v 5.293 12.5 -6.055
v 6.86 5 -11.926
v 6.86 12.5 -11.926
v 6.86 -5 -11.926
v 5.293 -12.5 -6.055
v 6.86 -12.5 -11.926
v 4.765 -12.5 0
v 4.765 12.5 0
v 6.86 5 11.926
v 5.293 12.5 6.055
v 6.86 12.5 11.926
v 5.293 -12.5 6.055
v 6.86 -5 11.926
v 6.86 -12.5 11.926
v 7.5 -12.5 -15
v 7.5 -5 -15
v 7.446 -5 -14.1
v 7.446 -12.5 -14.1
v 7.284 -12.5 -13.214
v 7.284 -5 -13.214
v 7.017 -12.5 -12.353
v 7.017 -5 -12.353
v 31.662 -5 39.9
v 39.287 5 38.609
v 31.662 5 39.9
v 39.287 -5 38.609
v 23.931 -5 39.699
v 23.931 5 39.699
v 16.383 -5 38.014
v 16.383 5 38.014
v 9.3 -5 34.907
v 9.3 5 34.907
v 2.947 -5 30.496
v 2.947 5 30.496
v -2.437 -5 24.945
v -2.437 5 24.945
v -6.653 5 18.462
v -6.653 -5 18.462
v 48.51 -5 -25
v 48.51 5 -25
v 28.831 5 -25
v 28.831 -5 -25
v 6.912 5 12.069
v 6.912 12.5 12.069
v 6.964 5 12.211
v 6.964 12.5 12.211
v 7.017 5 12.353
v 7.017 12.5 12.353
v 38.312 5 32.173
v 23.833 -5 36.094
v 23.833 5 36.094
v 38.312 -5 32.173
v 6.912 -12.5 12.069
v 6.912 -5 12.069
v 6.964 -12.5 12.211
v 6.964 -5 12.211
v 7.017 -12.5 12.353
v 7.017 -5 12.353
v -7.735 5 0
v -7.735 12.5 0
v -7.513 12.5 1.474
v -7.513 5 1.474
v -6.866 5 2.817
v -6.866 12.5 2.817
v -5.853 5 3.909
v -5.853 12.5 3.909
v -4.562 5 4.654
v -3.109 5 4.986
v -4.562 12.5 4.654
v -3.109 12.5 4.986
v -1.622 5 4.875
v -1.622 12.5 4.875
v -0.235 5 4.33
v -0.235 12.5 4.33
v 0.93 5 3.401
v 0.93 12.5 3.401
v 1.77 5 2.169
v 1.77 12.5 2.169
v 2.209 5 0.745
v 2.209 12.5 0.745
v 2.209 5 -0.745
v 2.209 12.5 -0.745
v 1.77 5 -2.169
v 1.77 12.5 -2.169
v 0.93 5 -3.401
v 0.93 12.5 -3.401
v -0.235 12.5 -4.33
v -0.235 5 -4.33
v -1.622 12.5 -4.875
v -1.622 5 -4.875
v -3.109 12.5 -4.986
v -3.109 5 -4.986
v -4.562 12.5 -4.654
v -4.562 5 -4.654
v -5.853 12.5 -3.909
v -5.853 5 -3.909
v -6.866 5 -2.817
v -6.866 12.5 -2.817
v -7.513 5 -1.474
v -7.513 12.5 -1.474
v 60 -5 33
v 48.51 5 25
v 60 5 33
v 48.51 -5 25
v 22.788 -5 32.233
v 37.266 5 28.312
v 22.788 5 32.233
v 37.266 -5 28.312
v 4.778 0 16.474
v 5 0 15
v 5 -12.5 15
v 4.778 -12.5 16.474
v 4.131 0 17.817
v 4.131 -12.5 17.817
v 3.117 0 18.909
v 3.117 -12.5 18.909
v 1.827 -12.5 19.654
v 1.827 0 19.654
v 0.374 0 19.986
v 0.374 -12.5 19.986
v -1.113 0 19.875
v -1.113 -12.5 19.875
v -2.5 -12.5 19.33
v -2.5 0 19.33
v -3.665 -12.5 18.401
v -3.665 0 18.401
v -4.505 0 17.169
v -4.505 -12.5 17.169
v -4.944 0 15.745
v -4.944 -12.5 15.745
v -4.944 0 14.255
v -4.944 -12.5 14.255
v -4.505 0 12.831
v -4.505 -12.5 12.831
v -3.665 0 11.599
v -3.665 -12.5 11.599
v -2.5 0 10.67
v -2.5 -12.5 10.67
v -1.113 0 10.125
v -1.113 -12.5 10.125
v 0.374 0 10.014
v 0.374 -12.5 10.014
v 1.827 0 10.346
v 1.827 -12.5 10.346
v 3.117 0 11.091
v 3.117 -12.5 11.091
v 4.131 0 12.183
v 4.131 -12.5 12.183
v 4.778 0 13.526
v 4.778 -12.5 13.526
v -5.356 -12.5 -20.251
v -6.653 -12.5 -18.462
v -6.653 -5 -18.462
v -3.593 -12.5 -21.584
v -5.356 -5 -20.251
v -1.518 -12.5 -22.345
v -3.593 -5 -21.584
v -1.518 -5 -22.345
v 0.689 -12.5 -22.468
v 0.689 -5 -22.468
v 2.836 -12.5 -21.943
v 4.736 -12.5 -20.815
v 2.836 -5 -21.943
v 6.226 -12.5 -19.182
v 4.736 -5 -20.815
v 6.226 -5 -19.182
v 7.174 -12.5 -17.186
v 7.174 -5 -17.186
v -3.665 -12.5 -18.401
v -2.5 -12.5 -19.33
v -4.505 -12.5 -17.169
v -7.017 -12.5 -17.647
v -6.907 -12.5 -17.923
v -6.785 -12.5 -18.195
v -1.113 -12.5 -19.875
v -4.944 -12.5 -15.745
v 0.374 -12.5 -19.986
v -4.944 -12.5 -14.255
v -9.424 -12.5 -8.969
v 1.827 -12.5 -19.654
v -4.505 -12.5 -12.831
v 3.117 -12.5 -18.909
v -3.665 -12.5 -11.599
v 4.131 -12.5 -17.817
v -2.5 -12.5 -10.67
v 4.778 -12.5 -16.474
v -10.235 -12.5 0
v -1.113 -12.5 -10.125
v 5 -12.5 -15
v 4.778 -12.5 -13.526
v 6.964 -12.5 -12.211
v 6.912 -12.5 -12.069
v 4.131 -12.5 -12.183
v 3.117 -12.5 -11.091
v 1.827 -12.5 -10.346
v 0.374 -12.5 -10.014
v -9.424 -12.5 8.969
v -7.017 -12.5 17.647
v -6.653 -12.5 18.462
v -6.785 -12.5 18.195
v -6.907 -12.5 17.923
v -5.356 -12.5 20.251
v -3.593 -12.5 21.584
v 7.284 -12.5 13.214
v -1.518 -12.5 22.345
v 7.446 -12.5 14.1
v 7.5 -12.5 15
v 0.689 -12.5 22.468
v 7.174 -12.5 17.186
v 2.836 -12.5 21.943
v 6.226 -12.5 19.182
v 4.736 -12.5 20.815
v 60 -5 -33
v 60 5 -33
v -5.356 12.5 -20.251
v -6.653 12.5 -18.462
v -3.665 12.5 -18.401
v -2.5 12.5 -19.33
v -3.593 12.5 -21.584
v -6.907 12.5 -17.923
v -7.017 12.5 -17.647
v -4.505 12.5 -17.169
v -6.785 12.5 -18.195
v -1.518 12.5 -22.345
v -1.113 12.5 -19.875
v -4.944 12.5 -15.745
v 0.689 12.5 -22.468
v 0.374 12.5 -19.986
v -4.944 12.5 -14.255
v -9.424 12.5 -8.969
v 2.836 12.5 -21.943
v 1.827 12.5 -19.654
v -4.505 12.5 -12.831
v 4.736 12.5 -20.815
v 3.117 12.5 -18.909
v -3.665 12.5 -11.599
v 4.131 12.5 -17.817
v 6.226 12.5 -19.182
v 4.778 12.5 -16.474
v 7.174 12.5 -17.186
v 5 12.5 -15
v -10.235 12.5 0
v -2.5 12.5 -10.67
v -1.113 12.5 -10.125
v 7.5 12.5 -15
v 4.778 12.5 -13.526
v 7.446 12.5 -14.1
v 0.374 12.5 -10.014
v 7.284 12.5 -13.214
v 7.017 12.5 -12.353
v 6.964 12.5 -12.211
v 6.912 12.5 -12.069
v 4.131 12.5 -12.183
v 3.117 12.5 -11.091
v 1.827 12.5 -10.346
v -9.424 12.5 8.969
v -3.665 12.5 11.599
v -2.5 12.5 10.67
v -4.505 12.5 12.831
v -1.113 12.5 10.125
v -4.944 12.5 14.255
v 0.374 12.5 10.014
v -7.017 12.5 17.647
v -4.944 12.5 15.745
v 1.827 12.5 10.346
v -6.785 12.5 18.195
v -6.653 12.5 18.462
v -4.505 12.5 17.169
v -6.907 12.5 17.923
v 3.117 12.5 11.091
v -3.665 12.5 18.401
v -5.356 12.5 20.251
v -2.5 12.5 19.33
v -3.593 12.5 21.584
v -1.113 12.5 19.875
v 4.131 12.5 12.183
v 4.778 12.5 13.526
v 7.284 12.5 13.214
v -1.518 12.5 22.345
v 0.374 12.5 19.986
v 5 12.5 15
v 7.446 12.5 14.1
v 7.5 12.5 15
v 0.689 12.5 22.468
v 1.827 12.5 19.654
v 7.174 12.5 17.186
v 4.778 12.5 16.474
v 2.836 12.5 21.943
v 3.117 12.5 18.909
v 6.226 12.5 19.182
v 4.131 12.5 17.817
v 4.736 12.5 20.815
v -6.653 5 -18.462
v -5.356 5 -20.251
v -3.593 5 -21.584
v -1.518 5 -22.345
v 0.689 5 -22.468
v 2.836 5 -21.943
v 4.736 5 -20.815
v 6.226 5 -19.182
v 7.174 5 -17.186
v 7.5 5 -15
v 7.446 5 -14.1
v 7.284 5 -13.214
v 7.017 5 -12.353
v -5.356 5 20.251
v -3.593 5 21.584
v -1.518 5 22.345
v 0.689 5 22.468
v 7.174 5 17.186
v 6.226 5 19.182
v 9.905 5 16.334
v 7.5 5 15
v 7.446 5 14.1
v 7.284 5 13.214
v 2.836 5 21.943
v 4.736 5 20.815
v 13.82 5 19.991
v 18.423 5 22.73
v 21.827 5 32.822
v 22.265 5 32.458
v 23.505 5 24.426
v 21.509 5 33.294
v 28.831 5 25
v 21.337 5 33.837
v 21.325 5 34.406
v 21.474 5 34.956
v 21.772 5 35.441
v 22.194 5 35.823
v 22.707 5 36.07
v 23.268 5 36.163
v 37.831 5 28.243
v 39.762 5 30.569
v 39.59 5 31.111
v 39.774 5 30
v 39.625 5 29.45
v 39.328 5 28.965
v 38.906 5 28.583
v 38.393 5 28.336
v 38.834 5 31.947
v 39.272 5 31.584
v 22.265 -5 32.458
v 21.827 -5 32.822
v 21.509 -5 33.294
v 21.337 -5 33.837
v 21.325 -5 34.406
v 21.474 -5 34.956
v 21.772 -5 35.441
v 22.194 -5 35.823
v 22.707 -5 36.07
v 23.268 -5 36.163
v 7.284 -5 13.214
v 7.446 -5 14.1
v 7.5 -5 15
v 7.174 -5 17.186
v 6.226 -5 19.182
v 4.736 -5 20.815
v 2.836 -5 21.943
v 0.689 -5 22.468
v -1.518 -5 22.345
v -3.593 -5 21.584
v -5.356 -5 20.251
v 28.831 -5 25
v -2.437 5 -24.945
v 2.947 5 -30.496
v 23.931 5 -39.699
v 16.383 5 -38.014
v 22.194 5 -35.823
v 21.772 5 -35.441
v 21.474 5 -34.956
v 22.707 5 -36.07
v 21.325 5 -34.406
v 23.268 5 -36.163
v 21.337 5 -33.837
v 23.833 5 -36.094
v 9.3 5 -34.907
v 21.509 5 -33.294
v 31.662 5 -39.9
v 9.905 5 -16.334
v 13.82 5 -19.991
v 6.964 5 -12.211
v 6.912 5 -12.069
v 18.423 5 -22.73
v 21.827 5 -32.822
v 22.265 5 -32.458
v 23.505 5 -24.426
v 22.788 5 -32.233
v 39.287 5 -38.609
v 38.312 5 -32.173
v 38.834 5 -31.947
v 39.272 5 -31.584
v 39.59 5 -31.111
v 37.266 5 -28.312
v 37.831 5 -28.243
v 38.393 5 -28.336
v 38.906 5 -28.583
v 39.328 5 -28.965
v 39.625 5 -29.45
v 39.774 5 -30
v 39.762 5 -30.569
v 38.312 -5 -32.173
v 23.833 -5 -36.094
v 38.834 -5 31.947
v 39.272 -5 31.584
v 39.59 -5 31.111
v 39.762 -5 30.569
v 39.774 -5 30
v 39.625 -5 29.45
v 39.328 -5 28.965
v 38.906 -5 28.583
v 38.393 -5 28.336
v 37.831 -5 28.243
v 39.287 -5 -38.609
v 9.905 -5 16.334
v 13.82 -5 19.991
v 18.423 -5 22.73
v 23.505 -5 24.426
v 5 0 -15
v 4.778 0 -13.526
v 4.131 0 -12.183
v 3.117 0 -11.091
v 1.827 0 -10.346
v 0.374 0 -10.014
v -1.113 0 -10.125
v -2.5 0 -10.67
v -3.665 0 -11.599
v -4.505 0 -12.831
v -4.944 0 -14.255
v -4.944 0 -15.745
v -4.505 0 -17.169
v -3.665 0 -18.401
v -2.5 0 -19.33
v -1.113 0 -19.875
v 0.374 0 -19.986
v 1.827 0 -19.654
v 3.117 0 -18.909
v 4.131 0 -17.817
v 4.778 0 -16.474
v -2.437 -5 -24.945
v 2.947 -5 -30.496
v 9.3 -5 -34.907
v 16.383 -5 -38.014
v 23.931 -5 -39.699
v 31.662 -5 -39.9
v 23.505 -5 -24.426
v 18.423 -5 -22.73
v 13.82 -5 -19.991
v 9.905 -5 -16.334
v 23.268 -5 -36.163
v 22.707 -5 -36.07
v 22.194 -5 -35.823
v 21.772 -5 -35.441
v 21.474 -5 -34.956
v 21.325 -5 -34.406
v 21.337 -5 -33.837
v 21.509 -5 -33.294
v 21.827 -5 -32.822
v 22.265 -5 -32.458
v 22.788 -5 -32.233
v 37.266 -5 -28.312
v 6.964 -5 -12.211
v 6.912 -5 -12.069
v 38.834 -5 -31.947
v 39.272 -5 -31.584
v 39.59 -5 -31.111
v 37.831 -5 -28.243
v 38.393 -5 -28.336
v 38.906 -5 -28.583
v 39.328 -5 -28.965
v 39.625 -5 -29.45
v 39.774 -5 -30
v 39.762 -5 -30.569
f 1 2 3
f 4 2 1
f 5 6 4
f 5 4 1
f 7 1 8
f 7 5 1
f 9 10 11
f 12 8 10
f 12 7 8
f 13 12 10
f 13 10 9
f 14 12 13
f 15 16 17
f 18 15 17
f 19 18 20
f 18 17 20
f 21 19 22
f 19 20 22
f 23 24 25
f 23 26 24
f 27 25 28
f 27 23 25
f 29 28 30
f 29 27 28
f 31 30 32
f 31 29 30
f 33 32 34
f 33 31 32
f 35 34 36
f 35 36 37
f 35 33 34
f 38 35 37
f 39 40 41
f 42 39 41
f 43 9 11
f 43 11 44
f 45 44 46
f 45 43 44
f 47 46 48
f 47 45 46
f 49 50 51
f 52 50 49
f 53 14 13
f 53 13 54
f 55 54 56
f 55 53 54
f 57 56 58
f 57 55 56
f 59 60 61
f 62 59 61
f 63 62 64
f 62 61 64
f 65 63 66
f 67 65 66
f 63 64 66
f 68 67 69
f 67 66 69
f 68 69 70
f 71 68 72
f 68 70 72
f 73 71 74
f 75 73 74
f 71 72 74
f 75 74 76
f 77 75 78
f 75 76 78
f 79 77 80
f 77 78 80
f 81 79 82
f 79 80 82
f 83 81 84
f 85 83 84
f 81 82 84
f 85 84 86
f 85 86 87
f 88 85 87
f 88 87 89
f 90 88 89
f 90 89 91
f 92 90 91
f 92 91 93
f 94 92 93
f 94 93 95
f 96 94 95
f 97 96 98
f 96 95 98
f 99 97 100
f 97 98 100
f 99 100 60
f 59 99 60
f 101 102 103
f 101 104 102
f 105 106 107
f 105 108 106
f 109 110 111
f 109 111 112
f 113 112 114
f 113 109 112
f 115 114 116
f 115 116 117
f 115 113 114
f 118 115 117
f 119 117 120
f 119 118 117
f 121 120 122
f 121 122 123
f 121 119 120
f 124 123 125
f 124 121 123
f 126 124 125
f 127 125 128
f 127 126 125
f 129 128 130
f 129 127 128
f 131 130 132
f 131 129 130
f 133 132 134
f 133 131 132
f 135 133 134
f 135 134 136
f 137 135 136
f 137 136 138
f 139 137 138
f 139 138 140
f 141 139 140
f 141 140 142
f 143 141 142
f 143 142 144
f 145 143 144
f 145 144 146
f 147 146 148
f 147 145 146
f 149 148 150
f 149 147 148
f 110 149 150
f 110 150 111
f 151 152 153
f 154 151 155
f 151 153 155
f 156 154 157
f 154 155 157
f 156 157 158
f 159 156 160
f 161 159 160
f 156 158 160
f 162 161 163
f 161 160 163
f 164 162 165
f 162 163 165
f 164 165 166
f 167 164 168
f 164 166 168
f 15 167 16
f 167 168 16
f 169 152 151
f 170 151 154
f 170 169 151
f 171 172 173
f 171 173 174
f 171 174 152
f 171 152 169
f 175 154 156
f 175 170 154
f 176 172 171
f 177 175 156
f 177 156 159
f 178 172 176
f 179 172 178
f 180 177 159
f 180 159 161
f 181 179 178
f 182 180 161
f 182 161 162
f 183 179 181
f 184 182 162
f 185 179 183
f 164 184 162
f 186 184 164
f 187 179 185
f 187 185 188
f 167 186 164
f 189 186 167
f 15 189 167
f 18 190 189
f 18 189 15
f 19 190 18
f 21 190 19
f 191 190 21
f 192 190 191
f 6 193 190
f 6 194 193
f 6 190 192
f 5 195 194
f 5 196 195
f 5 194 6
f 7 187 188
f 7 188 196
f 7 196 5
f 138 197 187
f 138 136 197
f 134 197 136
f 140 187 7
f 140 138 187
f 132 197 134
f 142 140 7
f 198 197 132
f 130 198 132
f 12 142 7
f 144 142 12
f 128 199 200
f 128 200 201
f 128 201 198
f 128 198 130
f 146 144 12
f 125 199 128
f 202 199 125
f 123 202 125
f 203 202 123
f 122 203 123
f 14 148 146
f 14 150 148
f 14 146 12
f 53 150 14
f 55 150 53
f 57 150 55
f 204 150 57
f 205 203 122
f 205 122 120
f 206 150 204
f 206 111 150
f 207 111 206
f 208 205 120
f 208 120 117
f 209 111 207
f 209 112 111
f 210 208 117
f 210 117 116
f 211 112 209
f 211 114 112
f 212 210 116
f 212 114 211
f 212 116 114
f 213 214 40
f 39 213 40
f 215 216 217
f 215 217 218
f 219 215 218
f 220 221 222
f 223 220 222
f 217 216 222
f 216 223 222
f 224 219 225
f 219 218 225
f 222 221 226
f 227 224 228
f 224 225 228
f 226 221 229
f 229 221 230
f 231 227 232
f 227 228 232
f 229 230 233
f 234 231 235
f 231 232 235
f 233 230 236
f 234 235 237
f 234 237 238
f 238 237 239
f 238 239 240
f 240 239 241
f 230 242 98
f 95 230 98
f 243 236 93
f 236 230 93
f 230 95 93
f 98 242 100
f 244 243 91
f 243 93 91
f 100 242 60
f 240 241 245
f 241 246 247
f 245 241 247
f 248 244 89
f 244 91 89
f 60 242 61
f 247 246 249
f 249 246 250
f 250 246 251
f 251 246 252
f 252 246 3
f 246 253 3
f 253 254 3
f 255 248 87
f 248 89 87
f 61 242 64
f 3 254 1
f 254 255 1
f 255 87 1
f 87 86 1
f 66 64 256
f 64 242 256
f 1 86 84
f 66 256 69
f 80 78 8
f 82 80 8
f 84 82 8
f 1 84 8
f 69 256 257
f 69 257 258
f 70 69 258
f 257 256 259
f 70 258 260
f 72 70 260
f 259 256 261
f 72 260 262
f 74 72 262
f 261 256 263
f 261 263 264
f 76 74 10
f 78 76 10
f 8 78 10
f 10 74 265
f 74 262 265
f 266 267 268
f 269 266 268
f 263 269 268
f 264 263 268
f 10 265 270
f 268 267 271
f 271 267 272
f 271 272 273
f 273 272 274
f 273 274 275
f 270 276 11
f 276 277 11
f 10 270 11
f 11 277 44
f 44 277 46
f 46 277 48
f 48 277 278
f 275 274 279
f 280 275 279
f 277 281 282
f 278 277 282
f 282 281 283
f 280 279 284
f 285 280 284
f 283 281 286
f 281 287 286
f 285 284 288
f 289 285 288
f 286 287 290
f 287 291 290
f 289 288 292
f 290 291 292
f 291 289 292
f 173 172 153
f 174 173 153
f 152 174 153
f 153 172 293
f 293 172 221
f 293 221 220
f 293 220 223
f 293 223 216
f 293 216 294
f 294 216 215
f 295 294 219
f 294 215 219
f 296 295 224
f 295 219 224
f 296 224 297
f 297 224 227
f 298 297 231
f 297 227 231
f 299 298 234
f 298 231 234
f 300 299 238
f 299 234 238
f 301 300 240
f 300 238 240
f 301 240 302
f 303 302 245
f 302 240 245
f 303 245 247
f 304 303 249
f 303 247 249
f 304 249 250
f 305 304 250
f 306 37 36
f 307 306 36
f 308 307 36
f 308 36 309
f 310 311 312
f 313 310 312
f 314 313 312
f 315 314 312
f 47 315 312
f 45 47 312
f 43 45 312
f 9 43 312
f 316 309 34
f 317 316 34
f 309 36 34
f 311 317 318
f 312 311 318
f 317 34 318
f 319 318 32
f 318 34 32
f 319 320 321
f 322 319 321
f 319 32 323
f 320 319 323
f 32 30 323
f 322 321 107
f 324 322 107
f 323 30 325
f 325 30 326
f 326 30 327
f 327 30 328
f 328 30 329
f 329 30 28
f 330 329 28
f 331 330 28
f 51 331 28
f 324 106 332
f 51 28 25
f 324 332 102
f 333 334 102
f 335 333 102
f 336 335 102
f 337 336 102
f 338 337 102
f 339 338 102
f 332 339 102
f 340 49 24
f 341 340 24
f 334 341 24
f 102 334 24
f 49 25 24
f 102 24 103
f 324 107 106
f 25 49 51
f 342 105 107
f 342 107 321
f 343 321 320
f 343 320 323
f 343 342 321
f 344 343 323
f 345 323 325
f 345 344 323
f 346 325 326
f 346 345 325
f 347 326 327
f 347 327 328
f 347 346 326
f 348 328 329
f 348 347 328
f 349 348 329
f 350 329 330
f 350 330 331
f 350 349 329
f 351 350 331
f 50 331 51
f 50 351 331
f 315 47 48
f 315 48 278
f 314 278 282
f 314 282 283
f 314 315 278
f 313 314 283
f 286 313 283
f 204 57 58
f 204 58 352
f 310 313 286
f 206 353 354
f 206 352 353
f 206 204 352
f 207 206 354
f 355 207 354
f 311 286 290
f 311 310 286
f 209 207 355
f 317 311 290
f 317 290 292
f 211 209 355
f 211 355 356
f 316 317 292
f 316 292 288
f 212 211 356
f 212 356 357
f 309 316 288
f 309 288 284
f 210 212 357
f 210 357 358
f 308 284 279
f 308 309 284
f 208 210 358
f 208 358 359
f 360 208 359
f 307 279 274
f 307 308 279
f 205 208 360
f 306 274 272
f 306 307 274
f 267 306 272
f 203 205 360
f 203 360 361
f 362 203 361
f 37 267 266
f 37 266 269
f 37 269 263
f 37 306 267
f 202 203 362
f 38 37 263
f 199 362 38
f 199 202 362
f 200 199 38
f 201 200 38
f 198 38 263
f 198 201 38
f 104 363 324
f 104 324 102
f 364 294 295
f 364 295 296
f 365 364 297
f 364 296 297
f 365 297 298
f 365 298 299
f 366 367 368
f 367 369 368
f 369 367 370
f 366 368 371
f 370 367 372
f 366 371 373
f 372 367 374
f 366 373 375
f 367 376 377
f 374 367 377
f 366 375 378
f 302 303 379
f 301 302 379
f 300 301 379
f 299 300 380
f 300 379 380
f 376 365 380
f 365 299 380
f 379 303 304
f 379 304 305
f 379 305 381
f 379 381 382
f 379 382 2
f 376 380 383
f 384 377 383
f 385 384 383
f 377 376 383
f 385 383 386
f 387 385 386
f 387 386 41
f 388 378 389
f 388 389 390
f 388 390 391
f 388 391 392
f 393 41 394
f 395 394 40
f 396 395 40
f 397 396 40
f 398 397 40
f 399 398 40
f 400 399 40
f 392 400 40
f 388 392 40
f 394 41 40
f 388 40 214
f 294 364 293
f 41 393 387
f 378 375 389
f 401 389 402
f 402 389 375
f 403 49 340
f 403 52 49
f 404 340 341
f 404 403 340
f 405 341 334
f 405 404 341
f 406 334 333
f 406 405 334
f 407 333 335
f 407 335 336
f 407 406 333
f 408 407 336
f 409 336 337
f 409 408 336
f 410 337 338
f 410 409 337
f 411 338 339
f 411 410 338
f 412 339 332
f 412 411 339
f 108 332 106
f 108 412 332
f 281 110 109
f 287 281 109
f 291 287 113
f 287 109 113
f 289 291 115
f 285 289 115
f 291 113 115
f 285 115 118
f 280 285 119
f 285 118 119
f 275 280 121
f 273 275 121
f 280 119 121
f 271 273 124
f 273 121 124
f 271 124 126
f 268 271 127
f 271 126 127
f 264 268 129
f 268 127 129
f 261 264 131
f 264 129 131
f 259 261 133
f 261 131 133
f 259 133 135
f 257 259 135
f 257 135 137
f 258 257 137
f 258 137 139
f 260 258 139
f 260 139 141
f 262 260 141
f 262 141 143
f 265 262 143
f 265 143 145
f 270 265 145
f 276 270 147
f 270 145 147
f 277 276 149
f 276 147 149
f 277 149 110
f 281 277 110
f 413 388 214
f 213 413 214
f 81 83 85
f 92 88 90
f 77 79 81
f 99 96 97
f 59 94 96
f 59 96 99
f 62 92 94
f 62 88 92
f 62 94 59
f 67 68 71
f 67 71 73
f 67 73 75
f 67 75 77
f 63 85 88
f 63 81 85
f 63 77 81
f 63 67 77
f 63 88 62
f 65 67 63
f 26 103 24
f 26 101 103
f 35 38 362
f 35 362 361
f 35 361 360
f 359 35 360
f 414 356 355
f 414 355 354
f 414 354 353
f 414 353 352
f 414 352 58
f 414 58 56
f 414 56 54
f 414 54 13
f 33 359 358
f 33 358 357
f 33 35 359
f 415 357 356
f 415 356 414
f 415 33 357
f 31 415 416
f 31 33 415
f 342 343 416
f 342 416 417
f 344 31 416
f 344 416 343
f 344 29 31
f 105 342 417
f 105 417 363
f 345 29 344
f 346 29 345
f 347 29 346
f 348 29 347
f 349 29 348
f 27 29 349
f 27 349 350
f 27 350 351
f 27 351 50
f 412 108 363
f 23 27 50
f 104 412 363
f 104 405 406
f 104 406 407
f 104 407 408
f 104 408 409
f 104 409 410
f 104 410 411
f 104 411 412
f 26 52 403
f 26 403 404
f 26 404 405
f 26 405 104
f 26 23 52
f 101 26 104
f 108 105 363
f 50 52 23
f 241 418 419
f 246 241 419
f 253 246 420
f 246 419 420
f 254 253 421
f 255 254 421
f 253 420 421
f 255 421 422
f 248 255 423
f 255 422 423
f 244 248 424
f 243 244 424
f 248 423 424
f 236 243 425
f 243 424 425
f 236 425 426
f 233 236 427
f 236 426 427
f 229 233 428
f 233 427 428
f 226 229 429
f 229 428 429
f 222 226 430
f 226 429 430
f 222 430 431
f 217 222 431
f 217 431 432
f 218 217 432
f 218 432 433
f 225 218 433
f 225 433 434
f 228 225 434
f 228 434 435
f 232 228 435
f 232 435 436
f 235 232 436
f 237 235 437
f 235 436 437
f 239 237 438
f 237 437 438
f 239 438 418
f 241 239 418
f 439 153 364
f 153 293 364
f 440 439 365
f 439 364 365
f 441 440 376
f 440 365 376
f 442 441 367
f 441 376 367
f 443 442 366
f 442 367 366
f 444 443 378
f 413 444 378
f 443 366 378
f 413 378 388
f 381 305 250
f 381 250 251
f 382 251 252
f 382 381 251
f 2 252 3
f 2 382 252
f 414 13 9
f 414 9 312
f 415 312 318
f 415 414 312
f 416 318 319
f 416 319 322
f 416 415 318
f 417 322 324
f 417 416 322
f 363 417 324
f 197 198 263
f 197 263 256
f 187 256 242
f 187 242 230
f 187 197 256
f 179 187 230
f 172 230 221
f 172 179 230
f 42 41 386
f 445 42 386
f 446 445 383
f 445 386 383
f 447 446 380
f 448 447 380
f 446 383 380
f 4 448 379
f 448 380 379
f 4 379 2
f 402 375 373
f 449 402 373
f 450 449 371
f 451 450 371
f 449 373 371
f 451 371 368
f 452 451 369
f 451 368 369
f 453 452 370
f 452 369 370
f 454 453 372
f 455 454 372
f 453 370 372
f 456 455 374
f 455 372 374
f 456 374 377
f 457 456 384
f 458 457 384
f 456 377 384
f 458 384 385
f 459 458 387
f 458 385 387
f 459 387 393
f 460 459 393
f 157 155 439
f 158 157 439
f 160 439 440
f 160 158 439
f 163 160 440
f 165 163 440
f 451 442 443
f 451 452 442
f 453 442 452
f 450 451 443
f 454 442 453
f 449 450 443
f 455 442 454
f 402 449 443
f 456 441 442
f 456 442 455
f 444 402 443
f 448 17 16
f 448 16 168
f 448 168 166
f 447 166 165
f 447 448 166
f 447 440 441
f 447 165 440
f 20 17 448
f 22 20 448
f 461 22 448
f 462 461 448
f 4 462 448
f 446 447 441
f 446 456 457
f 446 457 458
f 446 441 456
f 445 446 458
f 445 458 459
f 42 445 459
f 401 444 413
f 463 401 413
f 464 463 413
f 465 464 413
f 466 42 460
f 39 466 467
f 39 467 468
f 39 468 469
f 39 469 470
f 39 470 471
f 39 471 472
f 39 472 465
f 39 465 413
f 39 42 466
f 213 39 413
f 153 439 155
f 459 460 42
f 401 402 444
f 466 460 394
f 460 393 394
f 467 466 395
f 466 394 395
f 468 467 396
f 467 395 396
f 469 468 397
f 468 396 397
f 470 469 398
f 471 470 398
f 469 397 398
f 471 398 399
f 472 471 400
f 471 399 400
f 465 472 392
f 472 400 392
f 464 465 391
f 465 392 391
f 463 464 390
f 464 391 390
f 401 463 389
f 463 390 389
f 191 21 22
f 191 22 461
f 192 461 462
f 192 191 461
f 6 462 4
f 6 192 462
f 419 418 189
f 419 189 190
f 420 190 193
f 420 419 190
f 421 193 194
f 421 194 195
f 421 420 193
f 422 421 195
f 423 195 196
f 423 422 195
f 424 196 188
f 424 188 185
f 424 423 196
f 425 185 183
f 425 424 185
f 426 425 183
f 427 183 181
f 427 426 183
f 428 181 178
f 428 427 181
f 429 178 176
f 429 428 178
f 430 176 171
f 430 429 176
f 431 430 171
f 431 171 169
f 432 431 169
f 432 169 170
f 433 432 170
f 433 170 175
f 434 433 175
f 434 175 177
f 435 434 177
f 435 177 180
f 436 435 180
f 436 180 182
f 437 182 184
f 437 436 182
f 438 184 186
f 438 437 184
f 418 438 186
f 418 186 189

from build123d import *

# Parameters (mm, degrees)
F0_R     = 5
F1_DEPTH = 12.5
F2_DEPTH = 5
F3_R     = 5
F5_DEPTH = 7.5


with BuildPart() as f1:
    # F0 (on Front) → F1 (new body, symmetric)
    with BuildSketch(Plane.XZ):
        with BuildLine():
            ThreePointArc((6.8596340788, 11.9264922445), (6.9377952197, 12.139972805), (7.0173413473, 12.3529411765))
            ThreePointArc((7.0173413473, 12.3529411765), (6.8474920043, 11.9402854297), (6.6534014969, 11.5384615385))
            ThreePointArc((6.6534014969, 11.5384615385), (6.7556652076, 11.7329300253), (6.8596340788, 11.9264922445))
        make_face()
        with BuildLine():
            ThreePointArc((7.0173413473, -12.3529411765), (6.9377952197, -12.139972805), (6.8596340788, -11.9264922445))
            ThreePointArc((6.8596340788, -11.9264922445), (6.7556652076, -11.7329300253), (6.6534014969, -11.5384615385))
            ThreePointArc((6.6534014969, -11.5384615385), (6.8474920043, -11.9402854297), (7.0173413473, -12.3529411765))
        make_face()
        with BuildLine():
            ThreePointArc((6.6534014969, -11.5384615385), (-3.0597145703, -8.1525079957), (-7.0173413473, -17.6470588235))
            ThreePointArc((-7.0173413473, -17.6470588235), (-6.8474920043, -18.0597145703), (-6.6534014969, -18.4615384615))
            ThreePointArc((-6.6534014969, -18.4615384615), (1.7817812398, -22.2852766326), (7.5, -15))
            ThreePointArc((7.5, -15), (7.3783487348, -13.6546487642), (7.0173413473, -12.3529411765))
            ThreePointArc((7.0173413473, -12.3529411765), (6.8474920043, -11.9402854297), (6.6534014969, -11.5384615385))
        make_face()
        with Locations((0, -15)):
            Circle(F0_R, mode=Mode.SUBTRACT)
        with BuildLine():
            ThreePointArc((6.6534014969, 11.5384615385), (-3.0597145703, 8.1525079957), (-7.0173413473, 17.6470588235))
            ThreePointArc((-7.0173413473, 17.6470588235), (-10.2350656985, 0), (-7.0173413473, -17.6470588235))
            ThreePointArc((-7.0173413473, -17.6470588235), (-3.0597145703, -8.1525079957), (6.6534014969, -11.5384615385))
            ThreePointArc((6.6534014969, -11.5384615385), (6.7556652076, -11.7329300253), (6.8596340788, -11.9264922445))
            ThreePointArc((6.8596340788, -11.9264922445), (4.7649343015, 0), (6.8596340788, 11.9264922445))
            ThreePointArc((6.8596340788, 11.9264922445), (6.7556652076, 11.7329300253), (6.6534014969, 11.5384615385))
        make_face()
        with BuildLine():
            ThreePointArc((7.0173413473, 12.3529411765), (7.3783487348, 13.6546487642), (7.5, 15))
            ThreePointArc((7.5, 15), (1.7817812398, 22.2852766326), (-6.6534014969, 18.4615384615))
            ThreePointArc((-6.6534014969, 18.4615384615), (-6.8474920043, 18.0597145703), (-7.0173413473, 17.6470588235))
            ThreePointArc((-7.0173413473, 17.6470588235), (-3.0597145703, 8.1525079957), (6.6534014969, 11.5384615385))
            ThreePointArc((6.6534014969, 11.5384615385), (6.8474920043, 11.9402854297), (7.0173413473, 12.3529411765))
        make_face()
        with Locations((0, 15)):
            Circle(F0_R, mode=Mode.SUBTRACT)
    extrude(amount=F1_DEPTH, both=True)

    # F0 (on Front) → F2 (join, symmetric)
    with BuildSketch(Plane.XZ):
        with BuildLine():
            ThreePointArc((28.8314064867, -25), (16.0478683636, -21.4844397892), (6.8596340788, -11.9264922445))
            ThreePointArc((6.8596340788, -11.9264922445), (6.9377952197, -12.139972805), (7.0173413473, -12.3529411765))
            ThreePointArc((7.0173413473, -12.3529411765), (7.3783487348, -13.6546487642), (7.5, -15))
            ThreePointArc((7.5, -15), (1.7817812398, -22.2852766326), (-6.6534014969, -18.4615384615))
            ThreePointArc((-6.6534014969, -18.4615384615), (12.7660784434, -36.6320247169), (39.2872644776, -38.6092609833))
            Line((39.2872644776, -38.6092609833), (60, -33))
            Line((60, -33), (48.5096588292, -25))
            Line((48.5096588292, -25), (28.8314064867, -25))
        make_face()
        with BuildLine():
            ThreePointArc((37.2661231393, -28.311901738), (39.719379088, -29.7195718876), (38.3117089384, -32.1728278363))
            Line((38.3117089384, -32.1728278363), (23.8332360697, -36.0937745829))
            ThreePointArc((23.8332360697, -36.0937745829), (21.3799801209, -34.6861044333), (22.7876502706, -32.2328484846))
            Line((22.7876502706, -32.2328484846), (37.2661231393, -28.311901738))
        make_face(mode=Mode.SUBTRACT)
        with BuildLine():
            ThreePointArc((-6.6534014969, 18.4615384615), (1.7817812398, 22.2852766326), (7.5, 15))
            ThreePointArc((7.5, 15), (7.3783487348, 13.6546487642), (7.0173413473, 12.3529411765))
            ThreePointArc((7.0173413473, 12.3529411765), (6.9377952197, 12.139972805), (6.8596340788, 11.9264922445))
            ThreePointArc((6.8596340788, 11.9264922445), (16.0478683636, 21.4844397892), (28.8314064867, 25))
            Line((28.8314064867, 25), (48.5096588292, 25))
            Line((48.5096588292, 25), (60, 33))
            Line((60, 33), (39.2872644776, 38.6092609833))
            ThreePointArc((39.2872644776, 38.6092609833), (12.7660784434, 36.6320247169), (-6.6534014969, 18.4615384615))
        make_face()
        with BuildLine():
            ThreePointArc((22.7876502706, 32.2328484846), (21.3799801209, 34.6861044333), (23.8332360697, 36.0937745829))
            Line((23.8332360697, 36.0937745829), (38.3117089384, 32.1728278363))
            ThreePointArc((38.3117089384, 32.1728278363), (39.719379088, 29.7195718876), (37.2661231393, 28.311901738))
            Line((37.2661231393, 28.311901738), (22.7876502706, 32.2328484846))
        make_face(mode=Mode.SUBTRACT)
    extrude(amount=F2_DEPTH, both=True)

    # F3 (on face) → F5 (cut, symmetric)
    with BuildSketch(Plane(origin=(0, 12.5, 0), x_dir=(-1, 0, 0), z_dir=(0, 1, 0))):
        with Locations((2.7350656985, 0)):
            Circle(F3_R)
    extrude(amount=F5_DEPTH, both=True, mode=Mode.SUBTRACT)


solid = f1.part
